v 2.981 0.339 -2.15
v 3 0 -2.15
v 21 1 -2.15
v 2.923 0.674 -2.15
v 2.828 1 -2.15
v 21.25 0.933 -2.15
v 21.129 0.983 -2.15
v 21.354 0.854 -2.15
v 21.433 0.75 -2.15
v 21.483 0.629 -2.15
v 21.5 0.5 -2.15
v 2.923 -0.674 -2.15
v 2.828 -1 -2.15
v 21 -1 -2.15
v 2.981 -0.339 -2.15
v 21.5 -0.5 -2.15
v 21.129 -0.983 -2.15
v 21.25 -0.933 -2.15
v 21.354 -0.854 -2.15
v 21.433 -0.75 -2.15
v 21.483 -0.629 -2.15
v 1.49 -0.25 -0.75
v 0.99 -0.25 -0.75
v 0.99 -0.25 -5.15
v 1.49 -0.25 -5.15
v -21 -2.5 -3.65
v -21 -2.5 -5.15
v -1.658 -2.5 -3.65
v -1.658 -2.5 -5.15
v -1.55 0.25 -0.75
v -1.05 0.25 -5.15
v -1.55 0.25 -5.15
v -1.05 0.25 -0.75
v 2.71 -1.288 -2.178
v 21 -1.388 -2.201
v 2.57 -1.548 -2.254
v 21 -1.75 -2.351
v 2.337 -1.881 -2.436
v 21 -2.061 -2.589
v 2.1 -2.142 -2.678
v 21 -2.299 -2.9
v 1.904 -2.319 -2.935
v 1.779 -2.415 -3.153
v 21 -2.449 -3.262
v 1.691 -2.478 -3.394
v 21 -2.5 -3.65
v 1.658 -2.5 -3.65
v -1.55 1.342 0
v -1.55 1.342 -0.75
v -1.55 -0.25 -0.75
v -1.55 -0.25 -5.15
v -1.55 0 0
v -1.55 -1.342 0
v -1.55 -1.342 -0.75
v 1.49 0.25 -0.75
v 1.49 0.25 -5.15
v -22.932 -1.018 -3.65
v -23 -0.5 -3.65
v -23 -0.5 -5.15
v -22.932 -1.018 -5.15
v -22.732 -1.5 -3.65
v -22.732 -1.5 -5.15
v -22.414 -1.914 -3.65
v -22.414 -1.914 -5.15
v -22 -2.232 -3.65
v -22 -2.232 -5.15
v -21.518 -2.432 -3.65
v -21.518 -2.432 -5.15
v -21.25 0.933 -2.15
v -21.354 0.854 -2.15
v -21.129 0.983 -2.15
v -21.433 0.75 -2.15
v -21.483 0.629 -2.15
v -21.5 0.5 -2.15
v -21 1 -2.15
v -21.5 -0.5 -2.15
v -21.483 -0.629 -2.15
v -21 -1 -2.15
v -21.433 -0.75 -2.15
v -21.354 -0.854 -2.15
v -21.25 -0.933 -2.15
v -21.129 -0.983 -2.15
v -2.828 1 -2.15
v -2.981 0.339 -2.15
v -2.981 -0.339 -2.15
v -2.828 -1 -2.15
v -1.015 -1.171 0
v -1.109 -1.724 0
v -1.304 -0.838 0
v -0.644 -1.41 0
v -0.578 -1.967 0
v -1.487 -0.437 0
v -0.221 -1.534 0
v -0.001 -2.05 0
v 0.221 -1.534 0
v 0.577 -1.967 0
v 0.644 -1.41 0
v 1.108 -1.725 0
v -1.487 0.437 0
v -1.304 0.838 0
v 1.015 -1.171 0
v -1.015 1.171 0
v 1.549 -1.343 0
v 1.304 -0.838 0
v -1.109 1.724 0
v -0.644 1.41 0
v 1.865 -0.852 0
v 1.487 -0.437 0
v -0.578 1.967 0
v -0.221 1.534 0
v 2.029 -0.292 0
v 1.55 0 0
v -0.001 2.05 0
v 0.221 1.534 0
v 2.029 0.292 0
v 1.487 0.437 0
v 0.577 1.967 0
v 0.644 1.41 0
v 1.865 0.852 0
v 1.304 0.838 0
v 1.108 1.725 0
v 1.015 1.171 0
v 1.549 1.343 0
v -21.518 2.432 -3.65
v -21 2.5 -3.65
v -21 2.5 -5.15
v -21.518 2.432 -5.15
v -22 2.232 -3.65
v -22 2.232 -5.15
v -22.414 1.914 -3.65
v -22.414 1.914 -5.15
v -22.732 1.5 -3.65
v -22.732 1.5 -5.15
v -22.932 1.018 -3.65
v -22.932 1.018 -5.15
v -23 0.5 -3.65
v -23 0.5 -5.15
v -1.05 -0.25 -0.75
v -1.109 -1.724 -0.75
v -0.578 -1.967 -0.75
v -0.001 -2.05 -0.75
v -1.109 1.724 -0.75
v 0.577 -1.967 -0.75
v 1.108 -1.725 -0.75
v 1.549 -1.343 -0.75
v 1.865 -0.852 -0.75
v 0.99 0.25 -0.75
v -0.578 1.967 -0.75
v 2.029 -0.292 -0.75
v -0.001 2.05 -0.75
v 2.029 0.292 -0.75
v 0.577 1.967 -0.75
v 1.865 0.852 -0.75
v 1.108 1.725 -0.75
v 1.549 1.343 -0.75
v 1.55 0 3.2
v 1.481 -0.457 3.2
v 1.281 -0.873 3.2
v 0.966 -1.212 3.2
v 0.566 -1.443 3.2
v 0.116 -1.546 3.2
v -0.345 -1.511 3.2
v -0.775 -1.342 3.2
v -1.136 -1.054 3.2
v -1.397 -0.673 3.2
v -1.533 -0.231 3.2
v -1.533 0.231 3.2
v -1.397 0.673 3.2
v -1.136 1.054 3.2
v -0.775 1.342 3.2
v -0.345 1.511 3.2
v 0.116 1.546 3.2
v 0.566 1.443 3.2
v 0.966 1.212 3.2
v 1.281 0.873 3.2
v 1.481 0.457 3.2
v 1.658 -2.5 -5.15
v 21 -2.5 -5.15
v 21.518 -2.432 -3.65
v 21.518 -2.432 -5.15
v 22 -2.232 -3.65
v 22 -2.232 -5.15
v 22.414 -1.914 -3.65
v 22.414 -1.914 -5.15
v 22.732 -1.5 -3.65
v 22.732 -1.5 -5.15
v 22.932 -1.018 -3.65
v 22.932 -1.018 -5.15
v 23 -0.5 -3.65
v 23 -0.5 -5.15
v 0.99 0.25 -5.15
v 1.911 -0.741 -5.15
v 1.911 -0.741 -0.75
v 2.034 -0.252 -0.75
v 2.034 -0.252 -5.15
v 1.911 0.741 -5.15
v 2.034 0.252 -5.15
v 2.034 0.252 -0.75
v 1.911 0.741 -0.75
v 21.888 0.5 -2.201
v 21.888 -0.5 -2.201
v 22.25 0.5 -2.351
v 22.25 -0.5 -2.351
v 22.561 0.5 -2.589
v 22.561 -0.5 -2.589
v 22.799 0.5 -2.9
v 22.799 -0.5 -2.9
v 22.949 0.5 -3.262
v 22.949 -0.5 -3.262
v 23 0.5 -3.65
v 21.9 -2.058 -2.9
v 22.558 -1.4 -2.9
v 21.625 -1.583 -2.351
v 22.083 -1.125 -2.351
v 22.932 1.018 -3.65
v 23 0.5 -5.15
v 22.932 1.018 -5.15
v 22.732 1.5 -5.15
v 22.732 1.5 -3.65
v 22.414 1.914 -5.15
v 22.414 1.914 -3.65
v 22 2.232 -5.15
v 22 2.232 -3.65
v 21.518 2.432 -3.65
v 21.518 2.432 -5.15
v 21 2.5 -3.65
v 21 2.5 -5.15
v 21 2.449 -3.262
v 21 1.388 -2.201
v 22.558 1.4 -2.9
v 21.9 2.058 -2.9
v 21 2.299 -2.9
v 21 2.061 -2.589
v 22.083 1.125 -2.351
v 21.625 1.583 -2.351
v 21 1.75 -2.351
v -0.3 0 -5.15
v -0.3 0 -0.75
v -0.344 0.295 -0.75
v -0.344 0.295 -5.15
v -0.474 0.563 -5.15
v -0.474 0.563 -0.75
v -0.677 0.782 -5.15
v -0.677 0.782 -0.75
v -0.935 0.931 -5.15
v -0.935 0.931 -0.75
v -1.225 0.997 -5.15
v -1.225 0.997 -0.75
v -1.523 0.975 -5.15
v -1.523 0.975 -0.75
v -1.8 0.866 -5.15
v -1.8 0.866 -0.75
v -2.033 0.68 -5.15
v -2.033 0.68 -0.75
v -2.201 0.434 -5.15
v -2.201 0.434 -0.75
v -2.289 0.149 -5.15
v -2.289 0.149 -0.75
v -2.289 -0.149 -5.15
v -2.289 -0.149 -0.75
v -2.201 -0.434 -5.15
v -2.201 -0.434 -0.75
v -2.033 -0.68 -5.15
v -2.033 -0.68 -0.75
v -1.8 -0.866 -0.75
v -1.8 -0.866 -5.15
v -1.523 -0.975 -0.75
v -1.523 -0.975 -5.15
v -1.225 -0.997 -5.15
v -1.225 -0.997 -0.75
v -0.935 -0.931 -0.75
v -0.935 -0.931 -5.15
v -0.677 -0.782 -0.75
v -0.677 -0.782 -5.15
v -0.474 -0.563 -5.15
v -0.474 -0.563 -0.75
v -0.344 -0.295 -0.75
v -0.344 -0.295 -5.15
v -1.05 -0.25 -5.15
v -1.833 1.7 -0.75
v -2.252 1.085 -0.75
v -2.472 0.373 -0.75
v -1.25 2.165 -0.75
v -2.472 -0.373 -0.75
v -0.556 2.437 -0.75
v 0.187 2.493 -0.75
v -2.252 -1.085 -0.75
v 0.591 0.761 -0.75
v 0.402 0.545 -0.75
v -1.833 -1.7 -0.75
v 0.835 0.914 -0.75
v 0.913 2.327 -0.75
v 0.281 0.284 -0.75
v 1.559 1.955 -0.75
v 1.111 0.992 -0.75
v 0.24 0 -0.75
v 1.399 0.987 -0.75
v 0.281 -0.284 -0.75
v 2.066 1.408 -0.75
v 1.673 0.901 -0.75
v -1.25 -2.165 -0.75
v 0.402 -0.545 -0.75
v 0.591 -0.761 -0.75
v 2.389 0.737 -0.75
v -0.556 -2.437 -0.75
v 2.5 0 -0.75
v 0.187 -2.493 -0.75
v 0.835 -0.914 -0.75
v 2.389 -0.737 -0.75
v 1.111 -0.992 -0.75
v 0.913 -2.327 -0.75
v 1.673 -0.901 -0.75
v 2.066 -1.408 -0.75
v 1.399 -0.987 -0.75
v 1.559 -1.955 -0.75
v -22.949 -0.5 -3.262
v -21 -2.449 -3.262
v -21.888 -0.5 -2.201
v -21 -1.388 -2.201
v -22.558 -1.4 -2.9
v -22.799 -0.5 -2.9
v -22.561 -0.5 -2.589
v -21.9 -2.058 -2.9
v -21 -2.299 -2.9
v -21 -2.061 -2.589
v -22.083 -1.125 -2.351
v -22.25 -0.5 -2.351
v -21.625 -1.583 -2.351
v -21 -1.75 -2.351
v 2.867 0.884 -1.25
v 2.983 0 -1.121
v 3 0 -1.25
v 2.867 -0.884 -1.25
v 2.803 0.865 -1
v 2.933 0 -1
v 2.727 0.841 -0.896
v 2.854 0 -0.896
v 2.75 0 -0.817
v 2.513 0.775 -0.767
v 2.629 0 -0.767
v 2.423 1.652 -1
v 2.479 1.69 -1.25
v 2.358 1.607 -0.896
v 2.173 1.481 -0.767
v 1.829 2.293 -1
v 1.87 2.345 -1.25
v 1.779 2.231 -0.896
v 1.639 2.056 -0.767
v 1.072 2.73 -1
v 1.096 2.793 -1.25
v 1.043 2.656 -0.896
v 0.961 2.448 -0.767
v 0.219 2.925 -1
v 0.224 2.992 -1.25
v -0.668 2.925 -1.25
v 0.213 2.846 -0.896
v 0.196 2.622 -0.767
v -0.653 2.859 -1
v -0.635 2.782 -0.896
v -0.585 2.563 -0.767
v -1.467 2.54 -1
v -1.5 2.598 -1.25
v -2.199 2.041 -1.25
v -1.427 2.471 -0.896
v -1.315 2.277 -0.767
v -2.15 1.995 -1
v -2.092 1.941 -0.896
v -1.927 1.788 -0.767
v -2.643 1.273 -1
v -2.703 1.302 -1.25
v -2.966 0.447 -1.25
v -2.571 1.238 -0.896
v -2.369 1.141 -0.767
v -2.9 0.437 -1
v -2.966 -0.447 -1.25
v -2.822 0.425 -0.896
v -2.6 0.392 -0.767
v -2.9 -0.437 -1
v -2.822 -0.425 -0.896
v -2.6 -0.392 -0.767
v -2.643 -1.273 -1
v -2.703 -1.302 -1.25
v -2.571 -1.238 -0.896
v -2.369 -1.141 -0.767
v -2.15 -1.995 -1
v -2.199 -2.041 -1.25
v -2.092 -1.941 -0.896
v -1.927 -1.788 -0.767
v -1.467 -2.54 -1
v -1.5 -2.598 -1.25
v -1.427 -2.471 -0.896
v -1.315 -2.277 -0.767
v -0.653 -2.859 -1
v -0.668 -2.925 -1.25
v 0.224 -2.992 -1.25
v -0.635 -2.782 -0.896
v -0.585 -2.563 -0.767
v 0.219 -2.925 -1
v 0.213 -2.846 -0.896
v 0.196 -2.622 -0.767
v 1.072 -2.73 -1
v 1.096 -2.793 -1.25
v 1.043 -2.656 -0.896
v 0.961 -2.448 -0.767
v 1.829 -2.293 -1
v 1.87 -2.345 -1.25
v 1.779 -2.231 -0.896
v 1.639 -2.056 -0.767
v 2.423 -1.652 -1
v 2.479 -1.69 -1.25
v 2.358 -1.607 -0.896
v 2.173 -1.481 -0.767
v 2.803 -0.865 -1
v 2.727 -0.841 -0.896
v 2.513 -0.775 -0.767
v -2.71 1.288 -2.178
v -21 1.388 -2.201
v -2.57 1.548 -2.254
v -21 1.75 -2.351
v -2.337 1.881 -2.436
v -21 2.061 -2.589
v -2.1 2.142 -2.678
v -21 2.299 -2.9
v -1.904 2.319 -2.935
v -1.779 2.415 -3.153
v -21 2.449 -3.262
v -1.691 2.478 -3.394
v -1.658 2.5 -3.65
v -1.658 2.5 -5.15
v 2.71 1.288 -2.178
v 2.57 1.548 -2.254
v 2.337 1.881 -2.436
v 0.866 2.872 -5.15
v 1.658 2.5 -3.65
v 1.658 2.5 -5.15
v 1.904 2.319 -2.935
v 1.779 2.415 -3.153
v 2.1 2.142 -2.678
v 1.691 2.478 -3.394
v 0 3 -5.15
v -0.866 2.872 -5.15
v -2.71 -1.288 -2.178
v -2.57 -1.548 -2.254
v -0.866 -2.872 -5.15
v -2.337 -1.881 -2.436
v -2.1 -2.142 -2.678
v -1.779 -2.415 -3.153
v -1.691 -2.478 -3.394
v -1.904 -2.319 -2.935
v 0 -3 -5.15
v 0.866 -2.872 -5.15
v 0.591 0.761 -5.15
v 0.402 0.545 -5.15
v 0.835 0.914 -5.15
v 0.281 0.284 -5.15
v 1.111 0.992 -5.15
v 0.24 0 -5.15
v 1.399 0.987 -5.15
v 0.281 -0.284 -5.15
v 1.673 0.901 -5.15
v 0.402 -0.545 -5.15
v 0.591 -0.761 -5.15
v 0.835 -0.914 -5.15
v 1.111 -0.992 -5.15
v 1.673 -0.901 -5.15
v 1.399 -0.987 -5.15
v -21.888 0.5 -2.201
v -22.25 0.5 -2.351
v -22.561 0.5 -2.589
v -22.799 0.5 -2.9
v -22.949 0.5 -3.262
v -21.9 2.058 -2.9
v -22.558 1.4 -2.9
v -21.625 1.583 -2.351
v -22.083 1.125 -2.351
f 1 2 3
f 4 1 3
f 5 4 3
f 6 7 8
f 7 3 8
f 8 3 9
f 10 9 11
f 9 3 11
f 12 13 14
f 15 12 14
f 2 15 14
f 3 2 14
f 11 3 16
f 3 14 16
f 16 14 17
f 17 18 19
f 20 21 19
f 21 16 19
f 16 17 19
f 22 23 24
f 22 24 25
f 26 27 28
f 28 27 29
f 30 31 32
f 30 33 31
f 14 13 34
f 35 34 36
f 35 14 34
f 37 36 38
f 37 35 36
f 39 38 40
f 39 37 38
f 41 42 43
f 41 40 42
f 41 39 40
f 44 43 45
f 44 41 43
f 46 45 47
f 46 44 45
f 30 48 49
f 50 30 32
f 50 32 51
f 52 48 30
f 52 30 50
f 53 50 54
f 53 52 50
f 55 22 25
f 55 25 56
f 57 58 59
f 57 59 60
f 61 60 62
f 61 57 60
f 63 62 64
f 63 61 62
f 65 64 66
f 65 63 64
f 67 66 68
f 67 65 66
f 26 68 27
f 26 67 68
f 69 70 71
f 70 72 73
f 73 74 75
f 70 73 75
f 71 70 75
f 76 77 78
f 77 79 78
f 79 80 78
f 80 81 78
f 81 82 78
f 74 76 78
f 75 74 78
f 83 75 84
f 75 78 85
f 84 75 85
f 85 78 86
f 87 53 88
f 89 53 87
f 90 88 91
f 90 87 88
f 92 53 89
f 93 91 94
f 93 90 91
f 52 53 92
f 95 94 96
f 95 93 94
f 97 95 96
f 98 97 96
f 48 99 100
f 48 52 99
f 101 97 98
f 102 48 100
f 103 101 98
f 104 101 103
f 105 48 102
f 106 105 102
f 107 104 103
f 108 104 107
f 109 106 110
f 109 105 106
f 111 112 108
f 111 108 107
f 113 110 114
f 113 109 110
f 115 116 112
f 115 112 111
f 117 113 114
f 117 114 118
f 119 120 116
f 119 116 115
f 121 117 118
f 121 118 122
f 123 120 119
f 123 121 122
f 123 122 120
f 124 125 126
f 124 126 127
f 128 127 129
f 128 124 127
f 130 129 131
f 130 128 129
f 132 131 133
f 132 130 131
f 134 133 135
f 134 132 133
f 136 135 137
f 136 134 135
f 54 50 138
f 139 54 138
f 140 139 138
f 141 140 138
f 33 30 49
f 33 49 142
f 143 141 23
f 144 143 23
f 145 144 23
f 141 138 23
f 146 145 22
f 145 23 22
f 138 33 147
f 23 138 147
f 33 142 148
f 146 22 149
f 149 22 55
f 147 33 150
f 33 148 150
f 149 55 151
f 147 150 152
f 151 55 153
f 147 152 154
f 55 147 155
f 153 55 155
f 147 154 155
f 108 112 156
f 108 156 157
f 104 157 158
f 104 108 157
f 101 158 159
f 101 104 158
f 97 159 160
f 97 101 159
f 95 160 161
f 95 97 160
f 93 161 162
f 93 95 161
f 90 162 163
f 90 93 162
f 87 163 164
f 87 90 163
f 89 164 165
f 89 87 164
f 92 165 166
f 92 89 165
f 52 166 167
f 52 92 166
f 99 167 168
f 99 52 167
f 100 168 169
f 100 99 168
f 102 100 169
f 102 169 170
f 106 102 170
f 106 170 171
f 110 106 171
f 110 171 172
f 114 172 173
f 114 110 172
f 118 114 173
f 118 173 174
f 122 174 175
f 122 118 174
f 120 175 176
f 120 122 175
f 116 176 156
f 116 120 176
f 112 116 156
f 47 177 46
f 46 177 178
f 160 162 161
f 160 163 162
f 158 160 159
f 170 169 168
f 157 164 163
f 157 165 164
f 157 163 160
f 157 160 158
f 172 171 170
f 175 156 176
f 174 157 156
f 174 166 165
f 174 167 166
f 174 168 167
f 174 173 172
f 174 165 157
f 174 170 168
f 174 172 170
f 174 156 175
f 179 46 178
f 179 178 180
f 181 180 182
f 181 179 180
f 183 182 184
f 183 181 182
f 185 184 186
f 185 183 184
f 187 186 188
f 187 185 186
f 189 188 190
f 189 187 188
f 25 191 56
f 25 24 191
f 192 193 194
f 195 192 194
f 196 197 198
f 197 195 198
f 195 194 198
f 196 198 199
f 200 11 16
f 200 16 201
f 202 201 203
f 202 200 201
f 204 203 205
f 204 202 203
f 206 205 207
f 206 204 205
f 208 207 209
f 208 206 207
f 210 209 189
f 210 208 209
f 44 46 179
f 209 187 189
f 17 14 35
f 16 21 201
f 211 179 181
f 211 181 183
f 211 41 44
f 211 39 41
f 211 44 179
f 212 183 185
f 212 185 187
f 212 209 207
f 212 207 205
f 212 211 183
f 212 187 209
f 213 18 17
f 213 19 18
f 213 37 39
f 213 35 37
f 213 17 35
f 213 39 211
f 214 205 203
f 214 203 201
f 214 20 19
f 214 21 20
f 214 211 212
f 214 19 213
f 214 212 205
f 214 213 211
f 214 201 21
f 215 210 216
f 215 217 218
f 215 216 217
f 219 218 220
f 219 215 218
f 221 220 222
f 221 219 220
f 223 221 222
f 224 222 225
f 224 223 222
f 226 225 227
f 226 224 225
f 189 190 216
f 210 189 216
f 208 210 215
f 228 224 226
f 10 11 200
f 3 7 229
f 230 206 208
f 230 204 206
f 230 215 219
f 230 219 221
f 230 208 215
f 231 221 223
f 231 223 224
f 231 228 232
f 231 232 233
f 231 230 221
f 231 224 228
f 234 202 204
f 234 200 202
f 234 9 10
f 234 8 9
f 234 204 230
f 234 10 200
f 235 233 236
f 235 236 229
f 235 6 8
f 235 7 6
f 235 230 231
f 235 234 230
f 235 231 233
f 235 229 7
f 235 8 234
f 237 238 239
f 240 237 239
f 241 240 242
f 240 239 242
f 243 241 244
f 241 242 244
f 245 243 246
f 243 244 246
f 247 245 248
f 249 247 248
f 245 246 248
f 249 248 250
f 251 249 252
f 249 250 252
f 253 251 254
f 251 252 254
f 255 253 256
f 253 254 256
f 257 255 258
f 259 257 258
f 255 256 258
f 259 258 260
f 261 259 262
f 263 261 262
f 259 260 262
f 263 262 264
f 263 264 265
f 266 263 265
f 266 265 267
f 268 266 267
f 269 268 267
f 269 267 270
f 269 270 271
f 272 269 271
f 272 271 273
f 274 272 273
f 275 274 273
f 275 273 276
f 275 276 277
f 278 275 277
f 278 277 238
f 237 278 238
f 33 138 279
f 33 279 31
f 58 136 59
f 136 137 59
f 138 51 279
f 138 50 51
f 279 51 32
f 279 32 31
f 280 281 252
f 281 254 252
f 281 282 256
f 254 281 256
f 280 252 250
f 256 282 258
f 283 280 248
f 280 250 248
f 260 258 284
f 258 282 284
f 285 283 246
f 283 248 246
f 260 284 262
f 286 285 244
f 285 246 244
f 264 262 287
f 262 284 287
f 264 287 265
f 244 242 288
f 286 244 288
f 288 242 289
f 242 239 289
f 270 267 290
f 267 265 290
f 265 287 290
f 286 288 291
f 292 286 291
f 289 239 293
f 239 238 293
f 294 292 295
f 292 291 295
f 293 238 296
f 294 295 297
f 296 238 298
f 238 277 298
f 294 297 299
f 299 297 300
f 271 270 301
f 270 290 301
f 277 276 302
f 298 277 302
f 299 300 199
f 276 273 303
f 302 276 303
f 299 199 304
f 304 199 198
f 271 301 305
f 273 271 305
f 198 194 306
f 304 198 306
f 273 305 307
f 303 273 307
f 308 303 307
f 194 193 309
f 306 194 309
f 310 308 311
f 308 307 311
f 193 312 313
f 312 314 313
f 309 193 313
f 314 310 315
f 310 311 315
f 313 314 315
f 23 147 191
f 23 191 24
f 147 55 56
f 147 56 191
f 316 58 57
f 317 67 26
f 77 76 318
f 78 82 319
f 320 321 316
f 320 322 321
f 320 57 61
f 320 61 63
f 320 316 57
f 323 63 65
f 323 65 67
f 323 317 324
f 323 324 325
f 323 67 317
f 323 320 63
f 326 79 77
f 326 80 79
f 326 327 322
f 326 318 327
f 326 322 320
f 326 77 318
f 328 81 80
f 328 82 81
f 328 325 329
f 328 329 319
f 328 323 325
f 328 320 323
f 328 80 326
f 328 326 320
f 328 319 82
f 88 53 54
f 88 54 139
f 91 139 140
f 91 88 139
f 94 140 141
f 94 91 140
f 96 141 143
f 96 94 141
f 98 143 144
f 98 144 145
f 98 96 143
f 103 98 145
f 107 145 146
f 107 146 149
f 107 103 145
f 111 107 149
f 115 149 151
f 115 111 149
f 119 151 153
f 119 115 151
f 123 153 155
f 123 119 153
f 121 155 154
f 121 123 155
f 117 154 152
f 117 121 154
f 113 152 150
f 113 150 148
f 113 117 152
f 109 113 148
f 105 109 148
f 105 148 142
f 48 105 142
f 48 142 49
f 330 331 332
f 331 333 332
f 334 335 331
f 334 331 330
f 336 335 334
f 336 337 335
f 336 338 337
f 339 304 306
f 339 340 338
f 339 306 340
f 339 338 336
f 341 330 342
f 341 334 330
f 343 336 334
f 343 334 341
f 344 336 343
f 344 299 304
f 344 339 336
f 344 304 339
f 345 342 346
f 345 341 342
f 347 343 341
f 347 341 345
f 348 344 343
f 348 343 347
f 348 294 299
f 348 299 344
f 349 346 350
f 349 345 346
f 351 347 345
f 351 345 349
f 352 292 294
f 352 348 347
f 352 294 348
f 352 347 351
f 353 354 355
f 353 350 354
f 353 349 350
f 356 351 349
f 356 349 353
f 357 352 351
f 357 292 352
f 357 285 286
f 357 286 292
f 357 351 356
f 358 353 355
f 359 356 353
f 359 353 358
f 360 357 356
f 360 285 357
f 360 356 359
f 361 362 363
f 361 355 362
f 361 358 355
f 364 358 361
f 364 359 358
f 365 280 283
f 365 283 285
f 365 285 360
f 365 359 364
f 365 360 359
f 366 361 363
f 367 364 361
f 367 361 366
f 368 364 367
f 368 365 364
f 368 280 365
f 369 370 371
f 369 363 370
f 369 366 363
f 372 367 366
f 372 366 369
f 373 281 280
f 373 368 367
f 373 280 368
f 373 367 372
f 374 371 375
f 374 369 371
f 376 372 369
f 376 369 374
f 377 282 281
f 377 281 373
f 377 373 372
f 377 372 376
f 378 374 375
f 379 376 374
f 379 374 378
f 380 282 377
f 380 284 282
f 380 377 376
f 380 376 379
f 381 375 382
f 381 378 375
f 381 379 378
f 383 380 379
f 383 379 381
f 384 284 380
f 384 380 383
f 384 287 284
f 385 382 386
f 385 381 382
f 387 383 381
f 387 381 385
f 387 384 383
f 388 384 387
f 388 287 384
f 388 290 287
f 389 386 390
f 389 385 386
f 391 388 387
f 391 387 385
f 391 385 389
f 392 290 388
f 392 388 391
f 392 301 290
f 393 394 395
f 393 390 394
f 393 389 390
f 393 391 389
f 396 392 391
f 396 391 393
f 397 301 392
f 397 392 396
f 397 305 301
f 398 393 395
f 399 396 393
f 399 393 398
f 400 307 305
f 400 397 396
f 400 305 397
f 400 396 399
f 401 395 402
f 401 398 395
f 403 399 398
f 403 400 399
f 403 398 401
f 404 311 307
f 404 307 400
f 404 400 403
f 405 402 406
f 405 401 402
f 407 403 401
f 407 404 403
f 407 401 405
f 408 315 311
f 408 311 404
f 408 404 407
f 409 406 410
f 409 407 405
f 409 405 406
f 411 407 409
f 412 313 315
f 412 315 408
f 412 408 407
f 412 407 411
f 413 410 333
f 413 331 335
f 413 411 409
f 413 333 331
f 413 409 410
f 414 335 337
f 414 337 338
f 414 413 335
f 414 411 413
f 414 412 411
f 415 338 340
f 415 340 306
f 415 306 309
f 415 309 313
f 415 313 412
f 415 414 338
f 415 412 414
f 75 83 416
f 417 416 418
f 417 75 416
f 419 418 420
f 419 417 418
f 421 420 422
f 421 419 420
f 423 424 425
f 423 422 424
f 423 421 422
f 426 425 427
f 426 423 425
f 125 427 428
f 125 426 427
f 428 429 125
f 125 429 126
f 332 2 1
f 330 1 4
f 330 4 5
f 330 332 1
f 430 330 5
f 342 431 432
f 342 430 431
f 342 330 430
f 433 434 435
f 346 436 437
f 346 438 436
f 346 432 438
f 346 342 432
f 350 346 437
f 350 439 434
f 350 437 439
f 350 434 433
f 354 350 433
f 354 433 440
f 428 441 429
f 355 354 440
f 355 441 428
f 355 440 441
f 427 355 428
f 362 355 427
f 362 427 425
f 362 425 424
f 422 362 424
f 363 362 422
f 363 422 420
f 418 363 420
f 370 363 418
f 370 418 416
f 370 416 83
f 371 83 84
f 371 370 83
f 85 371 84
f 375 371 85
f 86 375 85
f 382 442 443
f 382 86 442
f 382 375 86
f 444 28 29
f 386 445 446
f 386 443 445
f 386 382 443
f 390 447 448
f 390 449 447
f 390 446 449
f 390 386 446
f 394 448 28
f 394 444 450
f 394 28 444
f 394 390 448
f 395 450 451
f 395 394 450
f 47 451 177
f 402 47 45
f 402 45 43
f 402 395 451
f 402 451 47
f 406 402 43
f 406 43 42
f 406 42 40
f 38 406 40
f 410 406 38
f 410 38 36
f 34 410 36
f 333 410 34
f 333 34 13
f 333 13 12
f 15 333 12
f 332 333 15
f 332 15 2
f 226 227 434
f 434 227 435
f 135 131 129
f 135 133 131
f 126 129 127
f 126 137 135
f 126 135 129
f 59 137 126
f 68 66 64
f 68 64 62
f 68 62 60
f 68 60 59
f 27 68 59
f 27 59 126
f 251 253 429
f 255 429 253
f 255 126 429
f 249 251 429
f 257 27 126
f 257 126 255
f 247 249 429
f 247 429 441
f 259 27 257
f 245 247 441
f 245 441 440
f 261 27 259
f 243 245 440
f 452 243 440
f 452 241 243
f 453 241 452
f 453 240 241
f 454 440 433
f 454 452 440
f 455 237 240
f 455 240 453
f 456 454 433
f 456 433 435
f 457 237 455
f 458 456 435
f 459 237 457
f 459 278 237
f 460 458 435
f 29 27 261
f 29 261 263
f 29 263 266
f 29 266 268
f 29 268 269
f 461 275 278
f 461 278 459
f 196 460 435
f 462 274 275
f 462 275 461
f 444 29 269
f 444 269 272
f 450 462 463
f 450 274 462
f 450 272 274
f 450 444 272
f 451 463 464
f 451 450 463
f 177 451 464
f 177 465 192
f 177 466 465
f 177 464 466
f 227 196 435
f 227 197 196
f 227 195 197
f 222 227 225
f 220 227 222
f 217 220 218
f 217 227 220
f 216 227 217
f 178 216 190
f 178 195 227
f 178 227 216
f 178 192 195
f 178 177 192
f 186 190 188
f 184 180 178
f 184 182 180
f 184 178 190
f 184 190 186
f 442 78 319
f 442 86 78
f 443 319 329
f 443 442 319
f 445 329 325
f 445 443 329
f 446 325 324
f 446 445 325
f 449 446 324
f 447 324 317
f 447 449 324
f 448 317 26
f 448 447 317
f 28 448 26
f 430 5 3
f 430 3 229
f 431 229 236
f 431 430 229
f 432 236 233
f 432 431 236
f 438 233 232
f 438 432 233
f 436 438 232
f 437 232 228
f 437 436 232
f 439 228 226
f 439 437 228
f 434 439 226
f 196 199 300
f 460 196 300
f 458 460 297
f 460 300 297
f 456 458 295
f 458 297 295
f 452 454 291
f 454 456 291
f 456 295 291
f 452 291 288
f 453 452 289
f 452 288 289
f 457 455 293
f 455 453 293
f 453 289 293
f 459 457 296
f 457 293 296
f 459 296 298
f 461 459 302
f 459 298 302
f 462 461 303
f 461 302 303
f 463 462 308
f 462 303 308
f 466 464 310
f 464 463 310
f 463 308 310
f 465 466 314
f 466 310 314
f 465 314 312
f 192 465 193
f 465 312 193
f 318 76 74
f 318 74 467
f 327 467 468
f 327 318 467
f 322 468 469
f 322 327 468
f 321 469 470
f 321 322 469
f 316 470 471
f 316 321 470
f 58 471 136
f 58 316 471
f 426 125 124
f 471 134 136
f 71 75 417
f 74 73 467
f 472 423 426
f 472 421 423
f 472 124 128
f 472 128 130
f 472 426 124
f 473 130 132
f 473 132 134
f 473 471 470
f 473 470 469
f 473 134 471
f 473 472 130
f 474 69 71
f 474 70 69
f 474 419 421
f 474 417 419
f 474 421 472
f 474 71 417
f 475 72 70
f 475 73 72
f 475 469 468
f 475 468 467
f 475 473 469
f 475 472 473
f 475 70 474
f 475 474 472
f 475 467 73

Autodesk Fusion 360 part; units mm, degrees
sketch "Sketch2" plane through (0, 0, 0) normal (0, 0, 1) x (1, 0, 0)
  circle A0 centre (0, 0) radius 1.55
  line L0 (-1.55, 1.3416) -> (-1.55, -1.3416)
  arc A1 (-1.55, -1.3416) -> (-1.55, 1.3416) centre (0, 0) ccw
  dimension "d26" = 3.1
  dimension "d27" = 4.1
  dimension "d37" = 0
  dimension "d38" = 0
  dimension "d39" = 0
  dimension "d40" = 0
  dimension "d49" = 0
  dimension "d50" = 0
  dimension "d51" = 0
  dimension "d52" = 0
extrude "Extrude1" add sketch "Sketch2" along normal blind 3.2 contours A0 makes body 1
extrude "Extrude2" add sketch "Sketch2" against normal blind 0.75 contours A0 | L0 A1 bodies 1
sketch "Sketch3" plane through (0, 0, -0.75) normal (0, 0, -1) x (1, 0, 0)
  arc A0 (-1.55, -1.3416) -> (-1.55, 1.3416) centre (0, 0) ccw
  line L0 (-1.55, 1.3416) -> (-1.55, -1.3416)
  line L1 (-1.55, 0) -> (2.05, 0) construction
  line L2 (-1.55, 0.25) -> (-1.05, 0.25)
  line L3 (-1.05, 0.25) -> (-1.05, -0.25)
  line L4 (-1.05, -0.25) -> (-1.55, -0.25)
  line L5 (-1.55, -0.25) -> (-1.55, 0.25)
  line L6 (0.99, 0.25) -> (1.49, 0.25)
  line L7 (1.49, 0.25) -> (1.49, -0.25)
  line L8 (1.49, -0.25) -> (0.99, -0.25)
  line L9 (0.99, -0.25) -> (0.99, 0.25)
  line L10 (-1.3, -0.25) -> (-1.3, 0.25) construction
  line L11 (1.24, -0.25) -> (1.24, 0.25) construction
  point P0 (-1.55, 0)
  dimension "d32" = 2.54
  dimension "d33" = 0.5
  dimension "d34" = 0.5
extrude "Extrude3" add sketch "Sketch3" along normal blind 4.4 contours L0 L2 L3 L4 L5 | L6 L7 L8 L9 bodies 1
sketch "Sketch1" plane through (0, 0, -0.75) normal (0, 0, -1) x (1, 0, 0) in component "Component"
  line L0 (0.99, -0.25) -> (0.99, 0.25)
  line L1 (0.99, 0.25) -> (1.49, 0.25)
  line L2 (1.49, 0.25) -> (1.49, -0.25)
  line L3 (1.49, -0.25) -> (0.99, -0.25)
  line L4 (-1.55, 0.25) -> (-1.05, 0.25)
  line L5 (-1.05, 0.25) -> (-1.05, -0.25)
  line L6 (-1.05, -0.25) -> (-1.55, -0.25)
  line L7 (-1.55, -0.25) -> (-1.55, -1.3416)
  arc A0 (-1.55, -1.3416) -> (-1.55, 1.3416) centre (0, 0) ccw
  line L8 (-1.55, 1.3416) -> (-1.55, 0.25)
  circle A1 centre (0, 0) radius 3
  line L9 (0.99, 0) -> (1.49, 0) construction
  line L10 (1.24, 0.25) -> (1.24, -0.25) construction
  line L11 (-1.3, 0.25) -> (-1.3, -0.25) construction
  line L12 (-1.05, 0) -> (-1.55, 0) construction
  circle A2 centre (-1.3, 0) radius 1
  circle A3 centre (1.24, 0) radius 1
  point P0 (-1.55, 0)
  dimension "d1" = 6
  dimension "d2" = 2
extrude "Extrude1'" add sketch "Sketch1" along normal up to surface (4.4 mm away) separate body contours L7 A0 L8 A2 A3 | A0 A3 | A1 picked at (2.1096, 0) makes body 2 in component "Component"
sketch "Sketch2 (2)" plane through (0, 0, -5.15) normal (0, 0, -1) x (1, 0, 0) in component "Component"
  circle A0 centre (0, 0) radius 3
  circle A1 centre (-1.3, 0) radius 1
  circle A2 centre (1.24, 0) radius 1
  line L0 (-23, 2.5) -> (23, 2.5)
  line L1 (23, 2.5) -> (23, -2.5)
  line L2 (23, -2.5) -> (-23, -2.5)
  line L3 (-23, -2.5) -> (-23, 2.5)
  line L4 (23, 0) -> (-23, 0) construction
  line L5 (0, 2.5) -> (0, -2.5) construction
  dimension "d6" = 20
  dimension "d7" = 5
extrude "Extrude2'" add sketch "Sketch2 (2)" against normal blind 3 contours A0 L0 L1 L2 | A0 L0 L2 L3 bodies 2 in component "Component"
fillet "Fillet1" radius 2 4 edges at (23, -2.5, -3.65) (23, 2.5, -3.65) (-23, -2.5, -3.65) (-23, 2.5, -3.65) on bodies 2 in component "Component"
fillet "Fillet2" radius 1.5 10 edges at (-11.3292, 2.5, -2.15) (-22.4142, 1.9142, -2.15) (-23, 0, -2.15) (-22.4142, -1.9142, -2.15) (-11.3292, -2.5, -2.15) (11.3292, -2.5, -2.15) (22.4142, -1.9142, -2.15) (23, 0, -2.15) (22.4142, 1.9142, -2.15) (11.3292, 2.5, -2.15) on bodies 2 in component "Component"
fillet "Fillet3" radius 0.5 1 edges at (-2.797, 1.0848, -0.75) on bodies 2 in component "Component"
component "Component" placed x (1, 0, 0) y (0, 1, 0) z (0, 0, 1) at (0, 0, 0)
